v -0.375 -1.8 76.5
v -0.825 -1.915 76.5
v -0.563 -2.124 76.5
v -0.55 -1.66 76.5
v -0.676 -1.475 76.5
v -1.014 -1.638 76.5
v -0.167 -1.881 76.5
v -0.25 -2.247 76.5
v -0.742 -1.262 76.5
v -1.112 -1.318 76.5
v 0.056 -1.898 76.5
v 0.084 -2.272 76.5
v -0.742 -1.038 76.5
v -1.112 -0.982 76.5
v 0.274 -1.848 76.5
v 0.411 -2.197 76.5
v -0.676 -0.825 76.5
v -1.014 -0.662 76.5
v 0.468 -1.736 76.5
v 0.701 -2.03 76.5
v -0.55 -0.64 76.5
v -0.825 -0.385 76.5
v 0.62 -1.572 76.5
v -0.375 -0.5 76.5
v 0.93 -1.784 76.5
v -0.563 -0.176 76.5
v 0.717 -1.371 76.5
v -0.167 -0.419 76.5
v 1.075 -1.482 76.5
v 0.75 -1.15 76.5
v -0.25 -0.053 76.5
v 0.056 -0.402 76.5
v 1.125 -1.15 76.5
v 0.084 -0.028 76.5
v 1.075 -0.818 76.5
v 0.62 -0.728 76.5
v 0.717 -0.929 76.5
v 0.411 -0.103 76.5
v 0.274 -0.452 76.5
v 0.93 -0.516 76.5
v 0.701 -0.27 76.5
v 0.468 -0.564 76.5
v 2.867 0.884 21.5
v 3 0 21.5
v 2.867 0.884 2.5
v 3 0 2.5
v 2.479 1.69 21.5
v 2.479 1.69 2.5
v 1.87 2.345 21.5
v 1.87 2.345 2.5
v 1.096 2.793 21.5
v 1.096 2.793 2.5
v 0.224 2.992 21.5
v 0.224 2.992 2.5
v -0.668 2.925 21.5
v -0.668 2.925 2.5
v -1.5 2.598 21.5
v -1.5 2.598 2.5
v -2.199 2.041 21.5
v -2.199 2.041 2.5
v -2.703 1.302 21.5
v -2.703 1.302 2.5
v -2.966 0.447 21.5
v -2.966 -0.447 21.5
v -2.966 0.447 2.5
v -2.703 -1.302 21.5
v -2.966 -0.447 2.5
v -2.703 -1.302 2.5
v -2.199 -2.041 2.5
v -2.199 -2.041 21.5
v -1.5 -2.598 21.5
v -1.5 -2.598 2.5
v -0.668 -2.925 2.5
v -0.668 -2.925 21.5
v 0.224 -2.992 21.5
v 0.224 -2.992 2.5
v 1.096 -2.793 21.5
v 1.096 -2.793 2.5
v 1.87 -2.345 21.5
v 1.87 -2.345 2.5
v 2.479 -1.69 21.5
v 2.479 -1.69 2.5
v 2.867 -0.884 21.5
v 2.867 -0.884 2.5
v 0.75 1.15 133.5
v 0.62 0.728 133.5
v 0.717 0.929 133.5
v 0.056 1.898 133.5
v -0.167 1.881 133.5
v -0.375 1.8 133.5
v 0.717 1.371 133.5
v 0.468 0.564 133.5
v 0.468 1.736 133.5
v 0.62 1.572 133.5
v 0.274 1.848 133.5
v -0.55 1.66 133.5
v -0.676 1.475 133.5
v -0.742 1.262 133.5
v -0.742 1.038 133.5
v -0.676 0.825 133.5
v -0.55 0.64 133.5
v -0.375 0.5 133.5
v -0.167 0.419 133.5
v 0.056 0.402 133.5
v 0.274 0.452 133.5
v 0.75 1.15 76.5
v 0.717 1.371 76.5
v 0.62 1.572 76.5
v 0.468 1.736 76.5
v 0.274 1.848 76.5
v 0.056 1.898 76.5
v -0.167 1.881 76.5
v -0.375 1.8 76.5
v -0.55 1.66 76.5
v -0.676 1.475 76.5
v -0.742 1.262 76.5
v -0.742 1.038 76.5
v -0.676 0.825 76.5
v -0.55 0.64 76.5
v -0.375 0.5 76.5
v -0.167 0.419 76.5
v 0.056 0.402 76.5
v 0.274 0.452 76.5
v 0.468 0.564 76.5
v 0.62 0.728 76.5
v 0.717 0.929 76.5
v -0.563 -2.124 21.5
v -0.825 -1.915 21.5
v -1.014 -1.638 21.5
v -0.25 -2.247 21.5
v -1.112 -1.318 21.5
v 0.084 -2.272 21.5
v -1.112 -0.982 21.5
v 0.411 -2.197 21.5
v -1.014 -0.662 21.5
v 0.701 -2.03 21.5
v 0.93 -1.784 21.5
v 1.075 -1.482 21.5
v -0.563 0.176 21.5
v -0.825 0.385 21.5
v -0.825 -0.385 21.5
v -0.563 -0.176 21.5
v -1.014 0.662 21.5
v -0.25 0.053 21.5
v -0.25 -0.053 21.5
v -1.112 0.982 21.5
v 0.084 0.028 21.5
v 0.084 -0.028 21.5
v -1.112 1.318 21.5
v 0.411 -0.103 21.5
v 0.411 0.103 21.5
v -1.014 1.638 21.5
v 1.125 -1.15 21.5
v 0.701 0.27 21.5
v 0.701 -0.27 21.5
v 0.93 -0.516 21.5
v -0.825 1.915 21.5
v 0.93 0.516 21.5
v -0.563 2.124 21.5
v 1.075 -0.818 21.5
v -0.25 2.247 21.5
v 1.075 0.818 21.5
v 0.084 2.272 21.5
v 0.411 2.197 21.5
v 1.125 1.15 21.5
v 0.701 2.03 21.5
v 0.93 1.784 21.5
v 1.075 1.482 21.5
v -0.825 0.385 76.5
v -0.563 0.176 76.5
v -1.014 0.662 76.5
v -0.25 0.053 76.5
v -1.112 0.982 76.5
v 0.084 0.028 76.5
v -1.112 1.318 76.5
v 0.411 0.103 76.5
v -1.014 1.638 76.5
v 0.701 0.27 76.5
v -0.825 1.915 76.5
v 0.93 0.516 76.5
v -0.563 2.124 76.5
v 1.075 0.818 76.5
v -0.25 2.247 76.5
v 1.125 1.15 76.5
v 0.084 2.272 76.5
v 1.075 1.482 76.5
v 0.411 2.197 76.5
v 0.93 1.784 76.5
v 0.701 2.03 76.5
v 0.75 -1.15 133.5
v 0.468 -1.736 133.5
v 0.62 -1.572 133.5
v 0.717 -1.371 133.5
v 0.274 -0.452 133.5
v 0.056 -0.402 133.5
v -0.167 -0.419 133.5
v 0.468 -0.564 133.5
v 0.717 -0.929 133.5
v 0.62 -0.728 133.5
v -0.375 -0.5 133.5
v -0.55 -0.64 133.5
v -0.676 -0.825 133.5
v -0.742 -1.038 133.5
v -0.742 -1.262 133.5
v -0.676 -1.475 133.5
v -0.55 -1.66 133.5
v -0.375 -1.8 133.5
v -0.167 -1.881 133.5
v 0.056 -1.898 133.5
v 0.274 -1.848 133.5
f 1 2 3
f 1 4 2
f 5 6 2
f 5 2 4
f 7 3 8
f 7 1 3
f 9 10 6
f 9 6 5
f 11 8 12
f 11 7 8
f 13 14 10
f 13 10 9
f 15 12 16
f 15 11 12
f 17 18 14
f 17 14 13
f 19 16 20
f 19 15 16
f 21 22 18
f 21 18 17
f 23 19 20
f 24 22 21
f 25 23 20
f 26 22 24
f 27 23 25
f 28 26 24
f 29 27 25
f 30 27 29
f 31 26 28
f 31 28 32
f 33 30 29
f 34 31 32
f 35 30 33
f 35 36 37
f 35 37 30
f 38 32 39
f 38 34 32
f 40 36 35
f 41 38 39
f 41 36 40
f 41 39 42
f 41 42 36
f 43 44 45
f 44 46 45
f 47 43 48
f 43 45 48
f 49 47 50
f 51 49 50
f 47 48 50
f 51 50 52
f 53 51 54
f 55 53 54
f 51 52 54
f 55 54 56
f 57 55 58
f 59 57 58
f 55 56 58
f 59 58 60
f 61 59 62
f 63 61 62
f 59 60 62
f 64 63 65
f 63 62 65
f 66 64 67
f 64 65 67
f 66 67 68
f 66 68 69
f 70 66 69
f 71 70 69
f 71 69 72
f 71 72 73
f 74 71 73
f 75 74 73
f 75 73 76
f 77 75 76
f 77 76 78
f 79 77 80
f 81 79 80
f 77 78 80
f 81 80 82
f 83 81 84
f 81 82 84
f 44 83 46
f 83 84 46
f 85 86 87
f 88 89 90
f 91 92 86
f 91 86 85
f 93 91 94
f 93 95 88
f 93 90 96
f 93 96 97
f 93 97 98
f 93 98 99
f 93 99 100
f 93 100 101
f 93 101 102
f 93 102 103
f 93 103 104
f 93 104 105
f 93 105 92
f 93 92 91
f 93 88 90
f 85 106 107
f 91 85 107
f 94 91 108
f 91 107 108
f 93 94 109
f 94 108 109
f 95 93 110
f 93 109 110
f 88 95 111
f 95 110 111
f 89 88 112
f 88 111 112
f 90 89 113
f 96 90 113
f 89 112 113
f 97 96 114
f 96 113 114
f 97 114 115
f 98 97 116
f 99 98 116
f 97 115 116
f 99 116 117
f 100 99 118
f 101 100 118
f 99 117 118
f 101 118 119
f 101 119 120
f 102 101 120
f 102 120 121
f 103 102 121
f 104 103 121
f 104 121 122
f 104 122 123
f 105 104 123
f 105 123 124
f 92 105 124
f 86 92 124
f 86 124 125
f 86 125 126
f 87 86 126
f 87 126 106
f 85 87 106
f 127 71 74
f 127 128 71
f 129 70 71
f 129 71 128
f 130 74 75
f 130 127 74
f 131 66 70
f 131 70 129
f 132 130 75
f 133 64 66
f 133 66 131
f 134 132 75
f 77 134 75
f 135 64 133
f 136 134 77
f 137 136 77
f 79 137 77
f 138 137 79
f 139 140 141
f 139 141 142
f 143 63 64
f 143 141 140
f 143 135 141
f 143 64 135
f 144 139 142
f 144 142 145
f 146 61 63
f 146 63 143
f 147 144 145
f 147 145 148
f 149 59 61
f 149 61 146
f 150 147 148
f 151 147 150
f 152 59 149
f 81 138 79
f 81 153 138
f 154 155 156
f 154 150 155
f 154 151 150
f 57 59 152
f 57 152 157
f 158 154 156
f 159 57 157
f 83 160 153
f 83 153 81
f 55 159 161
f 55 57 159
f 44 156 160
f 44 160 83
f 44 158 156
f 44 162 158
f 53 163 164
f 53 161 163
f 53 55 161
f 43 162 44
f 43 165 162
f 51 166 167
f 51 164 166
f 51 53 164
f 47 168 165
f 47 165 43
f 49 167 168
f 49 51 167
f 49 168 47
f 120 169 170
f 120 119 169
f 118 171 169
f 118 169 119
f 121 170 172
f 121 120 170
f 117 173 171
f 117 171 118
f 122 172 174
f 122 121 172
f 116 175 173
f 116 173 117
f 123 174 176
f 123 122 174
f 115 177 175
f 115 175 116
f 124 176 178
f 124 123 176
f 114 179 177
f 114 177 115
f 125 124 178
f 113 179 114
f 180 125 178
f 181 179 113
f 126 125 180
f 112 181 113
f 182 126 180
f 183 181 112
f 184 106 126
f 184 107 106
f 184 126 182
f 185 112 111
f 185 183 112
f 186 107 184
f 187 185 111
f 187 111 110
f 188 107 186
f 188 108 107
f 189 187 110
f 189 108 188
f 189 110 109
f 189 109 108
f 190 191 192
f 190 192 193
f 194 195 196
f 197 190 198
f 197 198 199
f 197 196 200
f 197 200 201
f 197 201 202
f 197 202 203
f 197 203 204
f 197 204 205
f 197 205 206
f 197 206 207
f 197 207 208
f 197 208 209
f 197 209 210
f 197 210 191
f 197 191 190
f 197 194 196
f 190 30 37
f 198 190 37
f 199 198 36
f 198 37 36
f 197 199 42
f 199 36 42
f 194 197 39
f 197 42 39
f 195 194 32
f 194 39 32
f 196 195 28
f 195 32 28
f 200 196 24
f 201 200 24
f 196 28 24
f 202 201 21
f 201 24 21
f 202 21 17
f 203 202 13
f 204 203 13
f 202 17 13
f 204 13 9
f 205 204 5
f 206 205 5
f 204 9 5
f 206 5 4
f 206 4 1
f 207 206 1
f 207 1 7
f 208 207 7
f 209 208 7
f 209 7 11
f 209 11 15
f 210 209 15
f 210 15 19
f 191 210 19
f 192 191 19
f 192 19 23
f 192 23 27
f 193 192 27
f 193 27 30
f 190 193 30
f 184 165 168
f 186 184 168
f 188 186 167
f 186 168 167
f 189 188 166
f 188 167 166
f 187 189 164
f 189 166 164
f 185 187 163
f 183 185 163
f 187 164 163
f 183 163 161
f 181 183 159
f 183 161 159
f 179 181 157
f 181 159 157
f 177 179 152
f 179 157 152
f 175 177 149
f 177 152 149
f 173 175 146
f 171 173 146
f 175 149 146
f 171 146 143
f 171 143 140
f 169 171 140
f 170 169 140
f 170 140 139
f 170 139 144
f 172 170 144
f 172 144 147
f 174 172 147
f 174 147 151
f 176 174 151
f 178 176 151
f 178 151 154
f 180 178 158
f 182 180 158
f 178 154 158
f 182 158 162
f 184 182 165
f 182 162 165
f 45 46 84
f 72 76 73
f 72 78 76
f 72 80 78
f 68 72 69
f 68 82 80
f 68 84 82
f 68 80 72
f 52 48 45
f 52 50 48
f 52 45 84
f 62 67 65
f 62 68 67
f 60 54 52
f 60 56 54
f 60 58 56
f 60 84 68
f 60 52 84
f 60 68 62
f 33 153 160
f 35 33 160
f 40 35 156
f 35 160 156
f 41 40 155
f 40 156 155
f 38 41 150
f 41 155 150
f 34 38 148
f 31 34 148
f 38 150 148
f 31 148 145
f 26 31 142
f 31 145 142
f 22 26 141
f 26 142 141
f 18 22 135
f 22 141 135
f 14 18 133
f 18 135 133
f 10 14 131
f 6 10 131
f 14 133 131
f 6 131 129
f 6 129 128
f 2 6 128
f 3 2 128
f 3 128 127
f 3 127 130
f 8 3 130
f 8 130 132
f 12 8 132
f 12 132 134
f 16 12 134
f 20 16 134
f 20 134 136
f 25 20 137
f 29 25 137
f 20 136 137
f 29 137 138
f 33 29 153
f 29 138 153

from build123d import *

# Parameters (mm, degrees)
CROQUIS1_R                   = 3
SALIENTE_EXTRUIR1_DEPTH      = 18
SALIENTE_EXTRUIR2_DEPTH      = 21.5
SALIENTE_EXTRUIR2_DEPTH_BACK = 1.5
CROQUIS1_2_R                 = 3
CROQUIS3_R                   = 3
CORTAR_EXTRUIR1_DEPTH        = 4
CROQUIS9_R                   = 1.125
SALIENTE_EXTRUIR3_DEPTH      = 55
CROQUIS10_R                  = 0.75
SALIENTE_EXTRUIR4_DEPTH      = 112


with BuildPart() as part:
    # Croquis1 → Saliente-Extruir1 (new body)
    with BuildSketch(Plane.XY):
        Circle(CROQUIS1_R)
    extrude(amount=SALIENTE_EXTRUIR1_DEPTH)

    # Croquis1<2> → Saliente-Extruir2 (add, two sides: drawn at the far end of the back side and taken through both)
    with BuildSketch(Plane.XY.offset(-SALIENTE_EXTRUIR2_DEPTH_BACK)):
        Circle(CROQUIS1_2_R)
    extrude(amount=SALIENTE_EXTRUIR2_DEPTH + SALIENTE_EXTRUIR2_DEPTH_BACK)

    # Croquis3 → Cortar-Extruir1 (cut)
    with BuildSketch(Plane(origin=(0, 0, -1.5), x_dir=(-1, 0, 0), z_dir=(0, 0, -1))):
        Circle(CROQUIS3_R)
    extrude(amount=-CORTAR_EXTRUIR1_DEPTH, mode=Mode.SUBTRACT)

    # Croquis9 → Saliente-Extruir3 (add)
    with BuildSketch(Plane.XY.offset(21.5)):
        with Locations((0, -1.15)):
            Circle(CROQUIS9_R)
        with Locations((0, 1.15)):
            Circle(CROQUIS9_R)
    extrude(amount=SALIENTE_EXTRUIR3_DEPTH)

    # Croquis10 → Saliente-Extruir4 (add)
    with BuildSketch(Plane.XY.offset(21.5)):
        with Locations((0, -1.15)):
            Circle(CROQUIS10_R)
        with Locations((0, 1.15)):
            Circle(CROQUIS10_R)
    extrude(amount=SALIENTE_EXTRUIR4_DEPTH)


solid = part.part
